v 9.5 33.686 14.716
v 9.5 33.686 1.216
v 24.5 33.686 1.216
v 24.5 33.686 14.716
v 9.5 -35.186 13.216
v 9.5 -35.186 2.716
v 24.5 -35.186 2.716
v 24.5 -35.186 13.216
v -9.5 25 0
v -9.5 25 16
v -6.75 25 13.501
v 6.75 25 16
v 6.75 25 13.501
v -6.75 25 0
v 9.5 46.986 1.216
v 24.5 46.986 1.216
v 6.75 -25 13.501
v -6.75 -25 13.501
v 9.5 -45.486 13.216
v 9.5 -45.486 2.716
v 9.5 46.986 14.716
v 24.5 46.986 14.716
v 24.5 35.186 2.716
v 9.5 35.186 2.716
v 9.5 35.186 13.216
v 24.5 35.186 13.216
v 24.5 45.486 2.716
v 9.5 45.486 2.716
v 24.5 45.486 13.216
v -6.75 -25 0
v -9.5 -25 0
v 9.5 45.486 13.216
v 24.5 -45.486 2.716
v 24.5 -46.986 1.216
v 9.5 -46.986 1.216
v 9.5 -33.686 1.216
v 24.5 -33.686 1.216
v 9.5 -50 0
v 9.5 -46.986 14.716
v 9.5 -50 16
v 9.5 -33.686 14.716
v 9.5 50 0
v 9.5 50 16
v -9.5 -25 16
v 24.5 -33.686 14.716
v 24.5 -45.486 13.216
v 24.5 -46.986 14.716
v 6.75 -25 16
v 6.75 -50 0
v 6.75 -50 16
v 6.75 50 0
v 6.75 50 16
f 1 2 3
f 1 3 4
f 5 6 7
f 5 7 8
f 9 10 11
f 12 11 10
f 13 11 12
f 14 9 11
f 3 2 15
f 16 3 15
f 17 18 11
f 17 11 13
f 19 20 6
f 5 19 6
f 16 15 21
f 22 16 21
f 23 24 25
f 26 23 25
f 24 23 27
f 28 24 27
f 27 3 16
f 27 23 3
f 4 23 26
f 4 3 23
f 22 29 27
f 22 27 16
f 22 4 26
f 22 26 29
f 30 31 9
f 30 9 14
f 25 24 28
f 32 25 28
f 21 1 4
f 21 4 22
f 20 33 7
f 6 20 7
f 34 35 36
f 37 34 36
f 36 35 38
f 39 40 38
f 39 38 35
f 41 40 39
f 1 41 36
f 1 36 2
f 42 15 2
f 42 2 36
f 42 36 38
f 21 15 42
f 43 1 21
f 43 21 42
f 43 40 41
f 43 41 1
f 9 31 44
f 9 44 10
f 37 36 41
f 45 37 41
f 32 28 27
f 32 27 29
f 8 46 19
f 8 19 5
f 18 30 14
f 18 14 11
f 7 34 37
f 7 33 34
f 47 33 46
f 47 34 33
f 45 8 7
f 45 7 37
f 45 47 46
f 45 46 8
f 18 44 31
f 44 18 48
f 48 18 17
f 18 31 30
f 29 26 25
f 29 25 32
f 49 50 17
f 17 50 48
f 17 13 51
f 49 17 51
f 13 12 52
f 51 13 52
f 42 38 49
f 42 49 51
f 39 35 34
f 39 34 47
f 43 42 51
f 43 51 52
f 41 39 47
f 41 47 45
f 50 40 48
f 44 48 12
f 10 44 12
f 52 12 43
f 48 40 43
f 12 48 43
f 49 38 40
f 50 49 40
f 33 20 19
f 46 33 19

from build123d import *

# Parameters (mm, degrees)
F0_W     = 19
F0_H     = 50
F1_DEPTH = 16
F2_W     = 13.5
F2_H     = 13.5011018194
F3_DEPTH = 50
F4_W     = 100
F4_H     = 16
F4_W_2   = 13.2999992773
F4_H_2   = 13.4999992773
F4_W_3   = 10.3
F4_H_3   = 10.5
F5_DEPTH = 2.75
F6_DEPTH = 15


with BuildPart() as f1:
    # F0 (on Top) → F1 (new body)
    with BuildSketch(Plane.XY):
        Rectangle(F0_W, F0_H)
    extrude(amount=F1_DEPTH)

    # F2 (on face) → F3 (cut)
    with BuildSketch(Plane.XZ.offset(25)):
        with Locations((0, 6.7505509097)):
            Rectangle(F2_W, F2_H)
    extrude(amount=-F3_DEPTH, mode=Mode.SUBTRACT)

    # F4 (on face) → F5 (join)
    with BuildSketch(Plane.YZ.offset(9.5)):
        with Locations((0, 8)):
            Rectangle(F4_W, F4_H)
        with Locations((-40.3361745238, 7.9659550227)):
            Rectangle(F4_W_2, F4_H_2, mode=Mode.SUBTRACT)
        with Locations((40.3361745238, 7.9659550227)):
            Rectangle(F4_W_2, F4_H_2, mode=Mode.SUBTRACT)
        with Locations((-40.3361745238, 7.9659550227)):
            Rectangle(F4_W_2, F4_H_2)
        with Locations((-40.3361745238, 7.9659550227)):
            Rectangle(F4_W_3, F4_H_3, mode=Mode.SUBTRACT)
        with Locations((40.3361745238, 7.9659550227)):
            Rectangle(F4_W_2, F4_H_2)
        with Locations((40.3361745238, 7.9659550227)):
            Rectangle(F4_W_3, F4_H_3, mode=Mode.SUBTRACT)
        with Locations((-40.3361745238, 7.9659550227)):
            Rectangle(F4_W_3, F4_H_3)
        with Locations((40.3361745238, 7.9659550227)):
            Rectangle(F4_W_3, F4_H_3)
    extrude(amount=-F5_DEPTH)

    # F4 (on face) → F6 (join)
    with BuildSketch(Plane.YZ.offset(9.5)):
        with Locations((-40.3361745238, 7.9659550227)):
            Rectangle(F4_W_2, F4_H_2)
        with Locations((-40.3361745238, 7.9659550227)):
            Rectangle(F4_W_3, F4_H_3, mode=Mode.SUBTRACT)
        with Locations((40.3361745238, 7.9659550227)):
            Rectangle(F4_W_2, F4_H_2)
        with Locations((40.3361745238, 7.9659550227)):
            Rectangle(F4_W_3, F4_H_3, mode=Mode.SUBTRACT)
    extrude(amount=F6_DEPTH)


solid = f1.part
